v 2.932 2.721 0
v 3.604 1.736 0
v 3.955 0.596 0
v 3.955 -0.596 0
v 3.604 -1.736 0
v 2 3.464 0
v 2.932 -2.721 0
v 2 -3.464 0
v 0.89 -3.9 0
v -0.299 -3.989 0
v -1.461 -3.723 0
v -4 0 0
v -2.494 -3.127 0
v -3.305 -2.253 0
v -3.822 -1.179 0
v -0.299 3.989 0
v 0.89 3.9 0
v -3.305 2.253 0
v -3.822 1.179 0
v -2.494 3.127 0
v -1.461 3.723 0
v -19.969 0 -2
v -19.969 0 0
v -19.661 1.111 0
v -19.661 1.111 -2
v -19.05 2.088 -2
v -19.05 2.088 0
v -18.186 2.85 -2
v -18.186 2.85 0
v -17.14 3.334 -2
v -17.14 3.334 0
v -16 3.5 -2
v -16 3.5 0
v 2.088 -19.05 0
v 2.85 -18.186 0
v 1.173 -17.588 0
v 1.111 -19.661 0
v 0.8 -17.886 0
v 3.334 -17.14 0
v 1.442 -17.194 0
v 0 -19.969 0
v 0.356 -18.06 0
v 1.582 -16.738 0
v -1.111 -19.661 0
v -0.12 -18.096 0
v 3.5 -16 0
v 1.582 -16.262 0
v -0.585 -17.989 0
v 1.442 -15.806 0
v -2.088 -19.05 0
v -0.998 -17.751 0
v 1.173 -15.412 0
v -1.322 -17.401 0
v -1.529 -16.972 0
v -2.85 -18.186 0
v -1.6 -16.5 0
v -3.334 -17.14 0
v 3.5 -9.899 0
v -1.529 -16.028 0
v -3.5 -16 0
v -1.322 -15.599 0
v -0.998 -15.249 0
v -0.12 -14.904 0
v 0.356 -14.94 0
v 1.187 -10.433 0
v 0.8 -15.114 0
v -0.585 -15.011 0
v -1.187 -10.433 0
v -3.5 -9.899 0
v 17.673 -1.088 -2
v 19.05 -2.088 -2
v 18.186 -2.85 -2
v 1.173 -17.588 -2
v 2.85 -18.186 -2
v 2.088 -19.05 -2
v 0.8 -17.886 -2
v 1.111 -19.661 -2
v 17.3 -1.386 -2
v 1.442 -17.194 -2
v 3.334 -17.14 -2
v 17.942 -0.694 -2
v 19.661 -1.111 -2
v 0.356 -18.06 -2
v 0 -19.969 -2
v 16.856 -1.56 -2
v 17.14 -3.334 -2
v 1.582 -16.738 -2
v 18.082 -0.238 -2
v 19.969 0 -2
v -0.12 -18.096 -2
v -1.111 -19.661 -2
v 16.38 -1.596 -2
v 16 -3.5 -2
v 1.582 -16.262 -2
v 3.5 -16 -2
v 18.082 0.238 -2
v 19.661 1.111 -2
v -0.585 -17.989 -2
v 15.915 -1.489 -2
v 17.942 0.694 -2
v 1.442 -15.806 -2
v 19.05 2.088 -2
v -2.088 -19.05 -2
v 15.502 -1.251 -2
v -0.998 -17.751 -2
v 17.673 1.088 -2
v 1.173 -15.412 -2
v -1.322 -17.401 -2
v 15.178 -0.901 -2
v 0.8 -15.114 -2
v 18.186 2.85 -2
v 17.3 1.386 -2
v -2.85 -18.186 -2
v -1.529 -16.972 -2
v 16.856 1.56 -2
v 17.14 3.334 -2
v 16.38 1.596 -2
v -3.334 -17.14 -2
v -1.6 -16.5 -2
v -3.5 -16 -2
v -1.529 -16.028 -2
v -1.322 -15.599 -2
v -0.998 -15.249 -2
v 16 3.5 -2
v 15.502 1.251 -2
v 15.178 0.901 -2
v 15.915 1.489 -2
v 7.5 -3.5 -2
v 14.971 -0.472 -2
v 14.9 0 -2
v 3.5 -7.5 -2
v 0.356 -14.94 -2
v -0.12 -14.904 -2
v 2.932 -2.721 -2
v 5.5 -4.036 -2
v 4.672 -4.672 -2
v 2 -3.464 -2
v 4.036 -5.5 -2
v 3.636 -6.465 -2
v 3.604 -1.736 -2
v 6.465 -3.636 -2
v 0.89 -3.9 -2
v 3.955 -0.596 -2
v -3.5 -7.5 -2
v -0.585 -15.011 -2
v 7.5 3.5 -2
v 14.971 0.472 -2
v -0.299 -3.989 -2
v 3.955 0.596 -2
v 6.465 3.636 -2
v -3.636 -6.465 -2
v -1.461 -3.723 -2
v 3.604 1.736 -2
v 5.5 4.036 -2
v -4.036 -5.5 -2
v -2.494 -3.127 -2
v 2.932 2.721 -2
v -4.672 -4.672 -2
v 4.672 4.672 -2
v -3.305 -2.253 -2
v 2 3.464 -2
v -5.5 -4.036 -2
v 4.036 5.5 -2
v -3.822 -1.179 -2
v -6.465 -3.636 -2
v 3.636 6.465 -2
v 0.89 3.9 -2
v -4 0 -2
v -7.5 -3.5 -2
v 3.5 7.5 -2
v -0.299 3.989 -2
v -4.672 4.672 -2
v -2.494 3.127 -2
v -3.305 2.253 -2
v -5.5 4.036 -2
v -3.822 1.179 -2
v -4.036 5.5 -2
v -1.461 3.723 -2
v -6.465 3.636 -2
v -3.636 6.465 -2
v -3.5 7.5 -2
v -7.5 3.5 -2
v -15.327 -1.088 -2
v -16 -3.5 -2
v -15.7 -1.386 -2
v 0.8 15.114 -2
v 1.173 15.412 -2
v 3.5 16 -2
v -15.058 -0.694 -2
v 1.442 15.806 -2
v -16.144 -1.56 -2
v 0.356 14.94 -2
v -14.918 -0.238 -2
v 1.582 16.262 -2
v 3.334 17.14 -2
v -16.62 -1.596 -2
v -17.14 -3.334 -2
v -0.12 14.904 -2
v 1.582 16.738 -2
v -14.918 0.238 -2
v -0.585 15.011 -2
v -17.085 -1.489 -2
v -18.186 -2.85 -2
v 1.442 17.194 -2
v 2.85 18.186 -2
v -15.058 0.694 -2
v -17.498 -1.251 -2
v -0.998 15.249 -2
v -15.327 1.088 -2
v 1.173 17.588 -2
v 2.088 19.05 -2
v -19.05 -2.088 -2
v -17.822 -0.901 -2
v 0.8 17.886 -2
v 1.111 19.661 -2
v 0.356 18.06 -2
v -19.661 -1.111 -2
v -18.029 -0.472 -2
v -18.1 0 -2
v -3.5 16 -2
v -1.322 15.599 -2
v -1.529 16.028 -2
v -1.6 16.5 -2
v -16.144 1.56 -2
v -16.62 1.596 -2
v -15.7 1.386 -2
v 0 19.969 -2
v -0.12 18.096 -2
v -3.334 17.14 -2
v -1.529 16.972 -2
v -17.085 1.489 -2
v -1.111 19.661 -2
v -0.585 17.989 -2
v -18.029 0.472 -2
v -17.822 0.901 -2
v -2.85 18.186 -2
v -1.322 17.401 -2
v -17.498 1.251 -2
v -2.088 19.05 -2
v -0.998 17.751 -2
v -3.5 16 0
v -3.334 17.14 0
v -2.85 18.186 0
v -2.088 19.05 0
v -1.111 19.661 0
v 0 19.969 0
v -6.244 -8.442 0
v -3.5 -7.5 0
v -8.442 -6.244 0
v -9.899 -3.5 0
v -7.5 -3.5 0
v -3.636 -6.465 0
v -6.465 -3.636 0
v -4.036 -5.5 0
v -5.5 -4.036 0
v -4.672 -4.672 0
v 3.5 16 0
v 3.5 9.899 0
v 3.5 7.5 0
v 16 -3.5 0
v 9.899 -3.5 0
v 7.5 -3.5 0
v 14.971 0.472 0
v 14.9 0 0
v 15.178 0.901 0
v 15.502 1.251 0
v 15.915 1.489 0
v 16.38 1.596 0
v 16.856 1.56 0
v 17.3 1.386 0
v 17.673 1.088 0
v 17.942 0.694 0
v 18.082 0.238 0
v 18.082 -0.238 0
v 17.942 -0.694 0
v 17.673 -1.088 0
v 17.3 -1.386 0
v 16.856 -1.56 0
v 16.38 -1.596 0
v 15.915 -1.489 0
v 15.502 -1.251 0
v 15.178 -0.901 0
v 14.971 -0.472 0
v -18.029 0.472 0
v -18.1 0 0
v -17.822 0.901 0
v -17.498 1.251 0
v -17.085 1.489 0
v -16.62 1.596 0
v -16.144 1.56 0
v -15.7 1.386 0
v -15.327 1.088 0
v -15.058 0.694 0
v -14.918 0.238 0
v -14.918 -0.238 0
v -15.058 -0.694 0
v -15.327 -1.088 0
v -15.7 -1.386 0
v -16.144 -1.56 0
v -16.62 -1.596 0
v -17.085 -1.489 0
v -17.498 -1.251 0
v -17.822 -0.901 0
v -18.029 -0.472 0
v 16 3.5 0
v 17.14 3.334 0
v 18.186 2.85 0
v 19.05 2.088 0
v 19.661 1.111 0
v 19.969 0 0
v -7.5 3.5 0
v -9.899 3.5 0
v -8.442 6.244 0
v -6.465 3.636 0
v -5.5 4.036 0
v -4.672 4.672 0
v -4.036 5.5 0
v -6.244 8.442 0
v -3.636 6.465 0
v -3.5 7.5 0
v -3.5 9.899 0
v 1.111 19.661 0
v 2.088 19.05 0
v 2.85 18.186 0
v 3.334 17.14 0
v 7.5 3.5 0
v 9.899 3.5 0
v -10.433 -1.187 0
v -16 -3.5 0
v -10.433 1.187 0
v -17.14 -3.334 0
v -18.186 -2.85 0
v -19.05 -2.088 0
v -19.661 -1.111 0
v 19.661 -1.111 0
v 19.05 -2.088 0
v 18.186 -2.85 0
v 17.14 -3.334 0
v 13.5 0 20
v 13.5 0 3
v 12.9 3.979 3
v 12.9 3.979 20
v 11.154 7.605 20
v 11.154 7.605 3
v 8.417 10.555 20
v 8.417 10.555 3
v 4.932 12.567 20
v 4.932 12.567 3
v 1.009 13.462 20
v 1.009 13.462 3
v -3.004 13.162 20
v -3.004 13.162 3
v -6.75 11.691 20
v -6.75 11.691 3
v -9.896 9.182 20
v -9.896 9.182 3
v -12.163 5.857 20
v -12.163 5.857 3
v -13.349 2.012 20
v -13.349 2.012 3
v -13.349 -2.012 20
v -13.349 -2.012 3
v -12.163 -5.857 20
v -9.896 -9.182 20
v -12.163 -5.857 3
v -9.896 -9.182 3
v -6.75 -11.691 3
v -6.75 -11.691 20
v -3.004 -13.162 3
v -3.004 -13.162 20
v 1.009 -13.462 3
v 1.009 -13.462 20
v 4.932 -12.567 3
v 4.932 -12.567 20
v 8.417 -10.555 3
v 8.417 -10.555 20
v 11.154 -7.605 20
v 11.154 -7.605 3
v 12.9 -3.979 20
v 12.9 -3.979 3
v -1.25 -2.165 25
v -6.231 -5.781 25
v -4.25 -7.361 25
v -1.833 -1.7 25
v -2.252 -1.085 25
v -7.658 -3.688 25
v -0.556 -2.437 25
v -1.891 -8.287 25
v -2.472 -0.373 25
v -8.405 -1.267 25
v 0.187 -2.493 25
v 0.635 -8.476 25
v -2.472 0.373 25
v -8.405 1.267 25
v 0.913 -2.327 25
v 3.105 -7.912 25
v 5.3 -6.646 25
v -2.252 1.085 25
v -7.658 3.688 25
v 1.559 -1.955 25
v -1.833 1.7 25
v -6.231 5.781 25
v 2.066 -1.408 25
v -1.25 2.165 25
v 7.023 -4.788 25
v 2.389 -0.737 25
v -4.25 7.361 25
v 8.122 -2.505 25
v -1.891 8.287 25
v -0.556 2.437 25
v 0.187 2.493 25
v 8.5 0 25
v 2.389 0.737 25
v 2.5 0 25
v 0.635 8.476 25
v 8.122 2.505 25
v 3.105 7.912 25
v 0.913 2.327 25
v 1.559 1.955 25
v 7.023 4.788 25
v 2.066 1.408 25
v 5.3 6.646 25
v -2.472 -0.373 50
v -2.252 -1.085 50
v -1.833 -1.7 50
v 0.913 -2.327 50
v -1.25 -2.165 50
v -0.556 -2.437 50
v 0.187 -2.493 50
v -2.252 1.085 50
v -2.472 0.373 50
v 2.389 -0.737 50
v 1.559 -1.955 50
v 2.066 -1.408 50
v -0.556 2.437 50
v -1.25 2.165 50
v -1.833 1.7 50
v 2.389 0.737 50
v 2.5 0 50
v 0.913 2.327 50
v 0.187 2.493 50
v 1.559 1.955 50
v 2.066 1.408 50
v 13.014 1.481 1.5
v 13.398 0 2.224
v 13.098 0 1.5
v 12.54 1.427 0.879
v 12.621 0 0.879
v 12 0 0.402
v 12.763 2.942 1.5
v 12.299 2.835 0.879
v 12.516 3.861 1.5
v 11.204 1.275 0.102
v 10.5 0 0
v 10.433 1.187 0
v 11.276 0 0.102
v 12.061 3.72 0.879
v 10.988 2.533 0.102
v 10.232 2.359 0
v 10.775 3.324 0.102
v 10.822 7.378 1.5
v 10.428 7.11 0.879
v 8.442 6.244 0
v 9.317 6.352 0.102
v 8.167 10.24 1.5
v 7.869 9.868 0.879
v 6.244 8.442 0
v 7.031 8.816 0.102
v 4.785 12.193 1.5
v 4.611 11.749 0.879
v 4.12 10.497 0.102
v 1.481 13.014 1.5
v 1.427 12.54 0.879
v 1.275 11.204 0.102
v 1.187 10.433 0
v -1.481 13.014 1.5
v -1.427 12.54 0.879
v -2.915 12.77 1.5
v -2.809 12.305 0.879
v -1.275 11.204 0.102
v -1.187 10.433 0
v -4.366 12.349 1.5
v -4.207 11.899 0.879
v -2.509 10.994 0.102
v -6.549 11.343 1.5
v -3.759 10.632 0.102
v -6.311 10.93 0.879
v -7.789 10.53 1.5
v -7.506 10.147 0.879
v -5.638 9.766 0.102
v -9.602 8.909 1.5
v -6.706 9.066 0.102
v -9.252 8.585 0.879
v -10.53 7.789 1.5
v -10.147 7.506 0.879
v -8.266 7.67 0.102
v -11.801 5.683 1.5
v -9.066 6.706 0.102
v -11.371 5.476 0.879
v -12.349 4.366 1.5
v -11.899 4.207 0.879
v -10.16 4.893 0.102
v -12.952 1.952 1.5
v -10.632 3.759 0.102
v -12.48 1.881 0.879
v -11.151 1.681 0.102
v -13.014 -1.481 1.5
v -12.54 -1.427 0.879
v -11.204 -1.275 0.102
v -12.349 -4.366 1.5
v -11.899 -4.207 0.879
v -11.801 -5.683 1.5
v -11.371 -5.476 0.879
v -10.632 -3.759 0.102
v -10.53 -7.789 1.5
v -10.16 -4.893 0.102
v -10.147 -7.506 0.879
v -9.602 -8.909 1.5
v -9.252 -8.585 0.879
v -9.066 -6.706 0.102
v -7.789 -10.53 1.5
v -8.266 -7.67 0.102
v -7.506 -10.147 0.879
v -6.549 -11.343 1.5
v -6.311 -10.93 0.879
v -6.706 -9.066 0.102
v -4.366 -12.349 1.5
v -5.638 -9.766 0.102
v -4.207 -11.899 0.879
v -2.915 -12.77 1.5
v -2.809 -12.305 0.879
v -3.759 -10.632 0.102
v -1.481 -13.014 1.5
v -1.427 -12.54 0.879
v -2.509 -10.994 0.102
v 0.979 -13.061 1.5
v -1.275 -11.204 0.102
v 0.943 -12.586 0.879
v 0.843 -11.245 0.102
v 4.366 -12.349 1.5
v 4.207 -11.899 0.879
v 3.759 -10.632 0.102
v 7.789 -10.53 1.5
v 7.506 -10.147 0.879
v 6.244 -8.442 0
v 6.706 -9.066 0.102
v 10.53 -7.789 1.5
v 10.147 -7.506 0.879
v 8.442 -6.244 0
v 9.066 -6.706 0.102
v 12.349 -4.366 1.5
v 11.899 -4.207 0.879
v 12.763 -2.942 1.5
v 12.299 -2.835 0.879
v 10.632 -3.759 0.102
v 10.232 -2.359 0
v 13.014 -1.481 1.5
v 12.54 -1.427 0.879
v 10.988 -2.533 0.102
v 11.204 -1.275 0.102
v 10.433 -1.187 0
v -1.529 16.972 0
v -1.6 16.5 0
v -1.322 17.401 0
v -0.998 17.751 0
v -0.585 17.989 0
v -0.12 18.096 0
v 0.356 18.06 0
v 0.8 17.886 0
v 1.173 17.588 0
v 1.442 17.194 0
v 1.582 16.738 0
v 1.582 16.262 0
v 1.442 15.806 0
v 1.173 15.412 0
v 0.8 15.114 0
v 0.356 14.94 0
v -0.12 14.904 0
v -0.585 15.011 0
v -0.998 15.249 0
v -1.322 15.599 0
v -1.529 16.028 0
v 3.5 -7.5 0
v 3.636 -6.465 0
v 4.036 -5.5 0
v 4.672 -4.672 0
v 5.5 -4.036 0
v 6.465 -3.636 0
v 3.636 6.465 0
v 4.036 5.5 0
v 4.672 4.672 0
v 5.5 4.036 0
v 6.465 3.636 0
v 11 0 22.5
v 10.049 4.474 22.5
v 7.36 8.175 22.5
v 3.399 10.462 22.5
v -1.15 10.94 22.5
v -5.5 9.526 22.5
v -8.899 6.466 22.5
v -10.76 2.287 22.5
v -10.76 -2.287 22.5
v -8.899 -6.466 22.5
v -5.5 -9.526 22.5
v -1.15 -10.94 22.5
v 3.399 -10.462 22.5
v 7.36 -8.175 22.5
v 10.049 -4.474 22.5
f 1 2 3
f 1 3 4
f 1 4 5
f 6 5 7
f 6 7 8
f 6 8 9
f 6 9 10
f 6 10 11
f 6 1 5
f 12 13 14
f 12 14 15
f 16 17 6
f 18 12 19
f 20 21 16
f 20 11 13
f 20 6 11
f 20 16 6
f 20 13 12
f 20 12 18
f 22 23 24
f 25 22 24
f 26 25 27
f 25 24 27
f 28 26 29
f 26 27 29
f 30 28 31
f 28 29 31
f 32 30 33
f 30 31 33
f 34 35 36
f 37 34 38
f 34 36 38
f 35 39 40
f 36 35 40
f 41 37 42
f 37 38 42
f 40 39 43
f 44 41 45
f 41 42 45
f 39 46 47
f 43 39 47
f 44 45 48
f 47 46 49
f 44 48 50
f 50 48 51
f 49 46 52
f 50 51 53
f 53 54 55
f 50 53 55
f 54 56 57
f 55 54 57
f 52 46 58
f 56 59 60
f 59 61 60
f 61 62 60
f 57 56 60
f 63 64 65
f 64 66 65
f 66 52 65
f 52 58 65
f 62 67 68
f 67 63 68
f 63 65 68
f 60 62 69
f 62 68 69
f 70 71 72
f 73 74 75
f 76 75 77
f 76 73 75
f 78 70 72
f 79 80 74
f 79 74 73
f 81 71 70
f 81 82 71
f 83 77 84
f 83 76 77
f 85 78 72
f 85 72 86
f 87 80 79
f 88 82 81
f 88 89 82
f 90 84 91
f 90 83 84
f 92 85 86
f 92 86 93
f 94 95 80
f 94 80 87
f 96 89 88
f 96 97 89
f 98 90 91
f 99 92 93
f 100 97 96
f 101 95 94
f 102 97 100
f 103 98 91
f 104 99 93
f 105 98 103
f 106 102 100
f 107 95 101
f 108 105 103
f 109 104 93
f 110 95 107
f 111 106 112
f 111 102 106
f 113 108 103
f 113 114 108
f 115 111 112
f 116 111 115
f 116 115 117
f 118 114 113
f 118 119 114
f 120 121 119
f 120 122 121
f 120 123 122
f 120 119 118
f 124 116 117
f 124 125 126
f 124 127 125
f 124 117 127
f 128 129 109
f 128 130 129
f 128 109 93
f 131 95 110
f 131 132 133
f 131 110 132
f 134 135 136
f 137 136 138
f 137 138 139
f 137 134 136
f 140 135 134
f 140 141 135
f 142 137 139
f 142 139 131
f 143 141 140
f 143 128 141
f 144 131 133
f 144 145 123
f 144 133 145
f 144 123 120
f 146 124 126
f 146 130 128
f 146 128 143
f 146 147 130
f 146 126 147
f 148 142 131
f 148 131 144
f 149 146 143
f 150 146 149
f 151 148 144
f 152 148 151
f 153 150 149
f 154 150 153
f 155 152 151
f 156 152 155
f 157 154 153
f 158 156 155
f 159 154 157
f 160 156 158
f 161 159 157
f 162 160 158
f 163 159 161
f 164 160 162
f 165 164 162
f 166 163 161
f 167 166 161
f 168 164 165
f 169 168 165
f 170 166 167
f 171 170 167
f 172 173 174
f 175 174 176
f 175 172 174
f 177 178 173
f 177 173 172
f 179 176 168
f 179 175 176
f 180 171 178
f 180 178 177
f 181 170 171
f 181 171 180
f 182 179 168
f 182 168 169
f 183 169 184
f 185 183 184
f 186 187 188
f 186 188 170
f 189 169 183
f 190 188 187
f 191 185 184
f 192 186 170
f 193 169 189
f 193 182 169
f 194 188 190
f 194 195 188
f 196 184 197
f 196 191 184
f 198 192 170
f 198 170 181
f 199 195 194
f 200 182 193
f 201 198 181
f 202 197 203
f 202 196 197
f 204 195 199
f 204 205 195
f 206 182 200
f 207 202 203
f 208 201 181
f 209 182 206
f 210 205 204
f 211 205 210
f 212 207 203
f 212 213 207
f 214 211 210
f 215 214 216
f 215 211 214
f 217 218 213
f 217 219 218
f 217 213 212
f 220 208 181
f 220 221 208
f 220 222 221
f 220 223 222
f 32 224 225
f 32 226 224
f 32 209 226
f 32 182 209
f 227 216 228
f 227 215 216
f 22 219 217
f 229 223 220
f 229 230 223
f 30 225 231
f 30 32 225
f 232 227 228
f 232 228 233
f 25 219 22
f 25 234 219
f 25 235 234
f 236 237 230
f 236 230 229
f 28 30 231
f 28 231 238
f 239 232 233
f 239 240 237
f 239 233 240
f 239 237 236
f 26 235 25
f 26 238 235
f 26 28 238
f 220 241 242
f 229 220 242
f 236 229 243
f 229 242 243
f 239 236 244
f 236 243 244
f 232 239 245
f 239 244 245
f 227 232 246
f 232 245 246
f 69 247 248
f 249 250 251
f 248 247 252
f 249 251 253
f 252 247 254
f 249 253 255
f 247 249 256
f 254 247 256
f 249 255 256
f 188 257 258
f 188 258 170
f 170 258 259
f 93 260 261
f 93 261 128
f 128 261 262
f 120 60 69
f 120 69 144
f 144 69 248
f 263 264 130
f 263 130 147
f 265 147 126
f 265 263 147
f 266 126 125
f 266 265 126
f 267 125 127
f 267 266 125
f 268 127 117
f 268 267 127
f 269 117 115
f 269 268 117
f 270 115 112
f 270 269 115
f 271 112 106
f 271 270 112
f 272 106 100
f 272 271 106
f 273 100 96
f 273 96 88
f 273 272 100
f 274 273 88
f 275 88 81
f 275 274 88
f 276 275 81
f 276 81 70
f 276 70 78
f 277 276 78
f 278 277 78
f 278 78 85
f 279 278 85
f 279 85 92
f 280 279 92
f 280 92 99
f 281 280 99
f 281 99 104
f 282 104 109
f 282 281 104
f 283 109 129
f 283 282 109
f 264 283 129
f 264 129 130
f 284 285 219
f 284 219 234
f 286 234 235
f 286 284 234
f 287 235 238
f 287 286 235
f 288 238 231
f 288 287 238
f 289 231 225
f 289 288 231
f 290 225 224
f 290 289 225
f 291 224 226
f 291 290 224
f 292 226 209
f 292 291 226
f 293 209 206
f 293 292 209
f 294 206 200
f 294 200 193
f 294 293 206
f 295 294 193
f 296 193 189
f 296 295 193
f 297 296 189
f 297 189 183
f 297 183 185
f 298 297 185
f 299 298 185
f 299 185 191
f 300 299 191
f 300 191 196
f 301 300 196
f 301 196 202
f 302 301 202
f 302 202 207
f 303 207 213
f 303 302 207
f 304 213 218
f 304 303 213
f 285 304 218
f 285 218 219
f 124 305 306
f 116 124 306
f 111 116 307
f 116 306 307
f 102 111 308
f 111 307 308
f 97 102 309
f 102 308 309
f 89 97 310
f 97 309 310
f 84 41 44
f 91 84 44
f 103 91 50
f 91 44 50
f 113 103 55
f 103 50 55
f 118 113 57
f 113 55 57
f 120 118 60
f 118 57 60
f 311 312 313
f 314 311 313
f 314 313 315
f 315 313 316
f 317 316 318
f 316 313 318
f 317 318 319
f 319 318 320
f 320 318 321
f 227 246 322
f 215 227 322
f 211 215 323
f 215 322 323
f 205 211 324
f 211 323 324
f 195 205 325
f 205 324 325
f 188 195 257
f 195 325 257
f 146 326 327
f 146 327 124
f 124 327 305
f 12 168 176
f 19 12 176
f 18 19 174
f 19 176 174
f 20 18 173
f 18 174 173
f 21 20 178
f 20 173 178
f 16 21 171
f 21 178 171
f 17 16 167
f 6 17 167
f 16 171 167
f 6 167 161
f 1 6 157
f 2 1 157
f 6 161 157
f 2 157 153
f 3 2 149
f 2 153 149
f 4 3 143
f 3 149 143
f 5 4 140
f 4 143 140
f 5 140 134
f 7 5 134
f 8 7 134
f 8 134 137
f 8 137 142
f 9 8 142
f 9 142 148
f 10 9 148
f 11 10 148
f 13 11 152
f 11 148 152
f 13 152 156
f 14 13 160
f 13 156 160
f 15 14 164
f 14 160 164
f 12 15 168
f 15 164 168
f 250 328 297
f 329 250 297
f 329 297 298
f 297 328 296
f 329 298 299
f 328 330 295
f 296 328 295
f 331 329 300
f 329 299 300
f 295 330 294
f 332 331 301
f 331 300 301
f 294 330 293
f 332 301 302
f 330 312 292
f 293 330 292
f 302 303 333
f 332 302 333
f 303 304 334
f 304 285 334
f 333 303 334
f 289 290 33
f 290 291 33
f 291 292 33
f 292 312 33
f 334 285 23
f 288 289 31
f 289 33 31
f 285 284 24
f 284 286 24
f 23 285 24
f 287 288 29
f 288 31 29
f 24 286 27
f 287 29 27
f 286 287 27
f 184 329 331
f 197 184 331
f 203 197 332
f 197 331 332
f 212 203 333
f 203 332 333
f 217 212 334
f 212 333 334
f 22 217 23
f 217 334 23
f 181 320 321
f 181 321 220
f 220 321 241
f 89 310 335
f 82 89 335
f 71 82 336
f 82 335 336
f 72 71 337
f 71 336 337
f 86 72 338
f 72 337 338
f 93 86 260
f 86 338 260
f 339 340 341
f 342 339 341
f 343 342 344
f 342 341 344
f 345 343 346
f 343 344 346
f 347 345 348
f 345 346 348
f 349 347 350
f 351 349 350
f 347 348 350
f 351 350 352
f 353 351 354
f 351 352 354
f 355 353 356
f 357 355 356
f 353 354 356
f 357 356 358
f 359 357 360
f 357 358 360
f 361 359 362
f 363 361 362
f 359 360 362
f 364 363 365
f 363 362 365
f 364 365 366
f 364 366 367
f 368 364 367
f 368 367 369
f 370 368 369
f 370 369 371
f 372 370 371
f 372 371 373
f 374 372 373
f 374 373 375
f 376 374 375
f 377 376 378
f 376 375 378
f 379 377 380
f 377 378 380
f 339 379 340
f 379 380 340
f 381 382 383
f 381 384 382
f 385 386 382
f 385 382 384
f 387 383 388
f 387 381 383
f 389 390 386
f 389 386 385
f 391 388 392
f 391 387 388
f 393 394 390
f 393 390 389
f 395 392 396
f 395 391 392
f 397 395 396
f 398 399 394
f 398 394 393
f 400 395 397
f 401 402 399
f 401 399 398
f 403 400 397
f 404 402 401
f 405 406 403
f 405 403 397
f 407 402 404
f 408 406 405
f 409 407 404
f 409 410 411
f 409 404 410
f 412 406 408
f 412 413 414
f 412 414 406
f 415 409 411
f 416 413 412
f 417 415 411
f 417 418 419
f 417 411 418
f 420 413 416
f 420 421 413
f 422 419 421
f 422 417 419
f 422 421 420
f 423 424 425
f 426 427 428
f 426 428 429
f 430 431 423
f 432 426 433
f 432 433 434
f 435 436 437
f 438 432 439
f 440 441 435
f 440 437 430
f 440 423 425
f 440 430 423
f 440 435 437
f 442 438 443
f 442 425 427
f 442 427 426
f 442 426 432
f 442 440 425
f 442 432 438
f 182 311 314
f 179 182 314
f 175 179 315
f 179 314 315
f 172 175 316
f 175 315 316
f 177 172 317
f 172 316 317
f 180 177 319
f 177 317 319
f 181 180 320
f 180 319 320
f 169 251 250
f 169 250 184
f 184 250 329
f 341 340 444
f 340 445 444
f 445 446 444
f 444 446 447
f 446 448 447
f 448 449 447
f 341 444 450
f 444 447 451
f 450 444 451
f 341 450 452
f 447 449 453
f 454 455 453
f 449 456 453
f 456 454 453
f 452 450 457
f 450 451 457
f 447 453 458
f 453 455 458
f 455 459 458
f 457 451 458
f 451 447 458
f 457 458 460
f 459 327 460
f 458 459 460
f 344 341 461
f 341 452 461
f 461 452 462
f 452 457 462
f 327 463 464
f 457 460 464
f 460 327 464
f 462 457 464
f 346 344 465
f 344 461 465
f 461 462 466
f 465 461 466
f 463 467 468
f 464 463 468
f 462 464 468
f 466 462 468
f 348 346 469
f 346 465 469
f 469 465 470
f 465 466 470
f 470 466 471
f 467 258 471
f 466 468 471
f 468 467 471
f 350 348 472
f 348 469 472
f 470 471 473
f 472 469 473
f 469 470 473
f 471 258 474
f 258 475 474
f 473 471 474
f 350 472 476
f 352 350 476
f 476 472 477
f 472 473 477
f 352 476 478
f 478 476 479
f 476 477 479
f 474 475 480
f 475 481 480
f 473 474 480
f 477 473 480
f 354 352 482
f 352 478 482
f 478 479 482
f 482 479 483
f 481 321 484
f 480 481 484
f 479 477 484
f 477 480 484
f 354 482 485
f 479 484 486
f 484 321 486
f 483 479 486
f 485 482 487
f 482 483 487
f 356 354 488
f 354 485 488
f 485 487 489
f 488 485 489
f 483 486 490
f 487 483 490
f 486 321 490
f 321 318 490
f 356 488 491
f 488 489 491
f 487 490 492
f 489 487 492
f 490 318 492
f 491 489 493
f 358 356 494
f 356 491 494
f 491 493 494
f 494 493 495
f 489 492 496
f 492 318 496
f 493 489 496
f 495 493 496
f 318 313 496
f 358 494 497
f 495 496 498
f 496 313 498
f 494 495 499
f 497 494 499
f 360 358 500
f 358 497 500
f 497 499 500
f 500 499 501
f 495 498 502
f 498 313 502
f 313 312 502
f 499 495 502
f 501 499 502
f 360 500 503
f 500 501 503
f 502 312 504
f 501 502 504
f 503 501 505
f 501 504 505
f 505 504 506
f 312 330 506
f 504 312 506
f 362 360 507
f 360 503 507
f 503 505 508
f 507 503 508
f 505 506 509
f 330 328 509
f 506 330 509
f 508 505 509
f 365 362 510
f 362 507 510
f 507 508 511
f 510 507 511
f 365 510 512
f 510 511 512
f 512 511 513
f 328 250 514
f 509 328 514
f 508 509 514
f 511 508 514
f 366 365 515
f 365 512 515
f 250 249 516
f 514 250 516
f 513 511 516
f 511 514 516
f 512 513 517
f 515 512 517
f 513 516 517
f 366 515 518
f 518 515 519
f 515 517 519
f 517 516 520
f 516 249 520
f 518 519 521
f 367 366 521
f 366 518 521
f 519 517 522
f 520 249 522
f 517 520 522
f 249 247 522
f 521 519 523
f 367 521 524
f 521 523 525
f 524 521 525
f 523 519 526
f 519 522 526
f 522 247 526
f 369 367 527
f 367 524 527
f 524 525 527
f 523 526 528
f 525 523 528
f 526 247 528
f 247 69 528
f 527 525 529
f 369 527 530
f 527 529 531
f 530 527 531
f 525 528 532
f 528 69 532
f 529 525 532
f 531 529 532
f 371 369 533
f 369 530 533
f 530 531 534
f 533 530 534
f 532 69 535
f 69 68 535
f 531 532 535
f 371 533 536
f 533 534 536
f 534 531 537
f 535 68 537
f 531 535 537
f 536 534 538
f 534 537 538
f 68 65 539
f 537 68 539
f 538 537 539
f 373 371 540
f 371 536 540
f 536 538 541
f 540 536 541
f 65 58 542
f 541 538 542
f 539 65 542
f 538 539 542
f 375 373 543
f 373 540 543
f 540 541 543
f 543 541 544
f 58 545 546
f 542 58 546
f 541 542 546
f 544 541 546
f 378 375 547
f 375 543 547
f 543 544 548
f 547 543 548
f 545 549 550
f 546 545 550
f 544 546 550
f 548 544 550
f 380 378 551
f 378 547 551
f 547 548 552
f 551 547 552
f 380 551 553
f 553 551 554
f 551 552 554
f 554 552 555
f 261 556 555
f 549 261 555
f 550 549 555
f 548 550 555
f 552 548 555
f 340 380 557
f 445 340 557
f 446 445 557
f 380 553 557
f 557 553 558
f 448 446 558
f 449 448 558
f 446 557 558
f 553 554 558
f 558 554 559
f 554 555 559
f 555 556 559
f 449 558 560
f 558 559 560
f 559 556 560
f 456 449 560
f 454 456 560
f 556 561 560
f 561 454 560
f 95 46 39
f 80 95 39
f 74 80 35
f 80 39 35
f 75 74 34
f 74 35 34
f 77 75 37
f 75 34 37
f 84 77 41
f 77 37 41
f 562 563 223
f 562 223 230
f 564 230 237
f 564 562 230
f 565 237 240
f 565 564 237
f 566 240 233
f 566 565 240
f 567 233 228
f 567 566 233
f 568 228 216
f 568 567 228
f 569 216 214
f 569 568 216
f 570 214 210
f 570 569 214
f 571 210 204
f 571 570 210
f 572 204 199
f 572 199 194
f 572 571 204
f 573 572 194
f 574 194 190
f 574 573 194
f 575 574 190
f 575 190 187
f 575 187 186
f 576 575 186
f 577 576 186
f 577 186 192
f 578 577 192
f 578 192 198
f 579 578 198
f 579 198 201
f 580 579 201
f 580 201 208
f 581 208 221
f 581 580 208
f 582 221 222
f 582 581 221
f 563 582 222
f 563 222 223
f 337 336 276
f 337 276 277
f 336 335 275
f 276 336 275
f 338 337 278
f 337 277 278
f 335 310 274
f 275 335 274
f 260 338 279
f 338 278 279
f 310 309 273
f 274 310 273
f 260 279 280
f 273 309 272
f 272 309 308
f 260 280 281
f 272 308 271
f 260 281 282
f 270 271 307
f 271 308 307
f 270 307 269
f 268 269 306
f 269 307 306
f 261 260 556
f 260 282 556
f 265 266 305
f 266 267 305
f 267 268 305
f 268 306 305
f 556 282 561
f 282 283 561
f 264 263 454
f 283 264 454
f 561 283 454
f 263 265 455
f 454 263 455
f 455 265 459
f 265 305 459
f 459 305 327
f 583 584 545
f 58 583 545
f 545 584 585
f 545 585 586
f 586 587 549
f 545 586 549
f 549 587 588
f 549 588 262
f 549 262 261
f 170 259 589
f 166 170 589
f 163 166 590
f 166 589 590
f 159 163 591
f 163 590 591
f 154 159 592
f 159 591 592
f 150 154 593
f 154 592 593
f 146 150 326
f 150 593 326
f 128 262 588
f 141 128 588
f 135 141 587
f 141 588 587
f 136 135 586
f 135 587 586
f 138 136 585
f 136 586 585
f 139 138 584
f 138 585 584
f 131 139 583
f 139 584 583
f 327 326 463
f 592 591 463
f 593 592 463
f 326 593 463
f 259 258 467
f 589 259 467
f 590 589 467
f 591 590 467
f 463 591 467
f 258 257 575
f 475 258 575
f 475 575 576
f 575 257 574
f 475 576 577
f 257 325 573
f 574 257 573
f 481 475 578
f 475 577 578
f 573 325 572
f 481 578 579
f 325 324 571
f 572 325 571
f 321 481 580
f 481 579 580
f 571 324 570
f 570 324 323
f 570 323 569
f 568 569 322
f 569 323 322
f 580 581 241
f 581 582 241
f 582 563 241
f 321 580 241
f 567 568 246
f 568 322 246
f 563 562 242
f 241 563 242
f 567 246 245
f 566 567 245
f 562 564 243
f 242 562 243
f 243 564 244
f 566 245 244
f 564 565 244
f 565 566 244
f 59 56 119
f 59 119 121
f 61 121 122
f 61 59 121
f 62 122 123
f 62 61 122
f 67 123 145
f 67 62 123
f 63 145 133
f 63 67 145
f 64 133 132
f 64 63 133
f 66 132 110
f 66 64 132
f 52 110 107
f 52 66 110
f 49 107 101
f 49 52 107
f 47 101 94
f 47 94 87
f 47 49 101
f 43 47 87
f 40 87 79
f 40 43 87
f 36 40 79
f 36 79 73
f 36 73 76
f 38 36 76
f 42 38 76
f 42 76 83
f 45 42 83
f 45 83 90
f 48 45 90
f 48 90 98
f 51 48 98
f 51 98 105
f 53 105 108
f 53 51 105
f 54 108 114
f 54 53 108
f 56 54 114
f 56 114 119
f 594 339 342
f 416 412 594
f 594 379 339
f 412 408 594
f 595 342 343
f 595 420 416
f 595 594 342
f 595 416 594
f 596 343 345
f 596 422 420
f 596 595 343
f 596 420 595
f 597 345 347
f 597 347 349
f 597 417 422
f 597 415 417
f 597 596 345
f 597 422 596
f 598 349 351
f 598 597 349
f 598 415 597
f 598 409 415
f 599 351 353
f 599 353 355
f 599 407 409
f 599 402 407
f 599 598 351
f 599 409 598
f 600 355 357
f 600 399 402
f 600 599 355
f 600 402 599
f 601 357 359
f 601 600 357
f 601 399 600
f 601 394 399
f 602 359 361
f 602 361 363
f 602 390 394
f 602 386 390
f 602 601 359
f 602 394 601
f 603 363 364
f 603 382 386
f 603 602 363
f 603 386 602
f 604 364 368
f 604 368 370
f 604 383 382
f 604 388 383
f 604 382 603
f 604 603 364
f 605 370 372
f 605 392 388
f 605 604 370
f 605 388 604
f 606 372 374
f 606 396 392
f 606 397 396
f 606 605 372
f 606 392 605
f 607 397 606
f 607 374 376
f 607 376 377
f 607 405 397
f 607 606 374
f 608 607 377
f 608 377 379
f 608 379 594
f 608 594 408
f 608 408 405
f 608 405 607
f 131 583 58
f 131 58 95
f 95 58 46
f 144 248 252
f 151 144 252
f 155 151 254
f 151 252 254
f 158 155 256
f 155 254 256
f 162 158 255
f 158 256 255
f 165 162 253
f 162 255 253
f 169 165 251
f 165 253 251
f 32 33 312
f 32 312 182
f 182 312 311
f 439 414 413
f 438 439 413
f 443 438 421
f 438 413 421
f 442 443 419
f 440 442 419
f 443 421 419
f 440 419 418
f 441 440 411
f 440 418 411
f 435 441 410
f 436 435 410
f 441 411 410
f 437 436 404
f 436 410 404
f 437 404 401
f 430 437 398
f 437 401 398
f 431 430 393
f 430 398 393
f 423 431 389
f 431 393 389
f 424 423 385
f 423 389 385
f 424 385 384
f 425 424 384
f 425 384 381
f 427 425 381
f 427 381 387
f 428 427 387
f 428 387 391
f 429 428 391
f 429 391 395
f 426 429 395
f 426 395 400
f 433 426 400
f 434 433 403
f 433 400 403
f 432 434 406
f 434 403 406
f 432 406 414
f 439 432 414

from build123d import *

# Parameters (mm, degrees)
SKETCH1_R           = 13.5
BOSS_EXTRUDE1_DEPTH = 25
SKETCH2_R           = 2.5
BOSS_EXTRUDE2_DEPTH = 25
FILLET1_R           = 3
CHAMFER1_SIZE       = 5
SKETCH3_R           = 1.6
BOSS_EXTRUDE3_DEPTH = 2
SKETCH4_R           = 4
CUT_EXTRUDE1_DEPTH  = 2


with BuildPart() as part:
    # Sketch1 → Boss-Extrude1 (new body)
    with BuildSketch(Plane.XY):
        Circle(SKETCH1_R)
    extrude(amount=BOSS_EXTRUDE1_DEPTH)

    # Sketch2 → Boss-Extrude2 (add)
    with BuildSketch(Plane.XY.offset(25)):
        Circle(SKETCH2_R)
    extrude(amount=BOSS_EXTRUDE2_DEPTH)

    # Fillet1
    fillet1_edges = [part.edges().sort_by_distance(p)[0] for p in [
        (-13.5, 0, 0),
    ]]
    fillet(fillet1_edges, radius=FILLET1_R)

    # Chamfer1
    chamfer1_edges = [part.edges().sort_by_distance(p)[0] for p in [
        (-13.5, 0, 25),
    ]]
    chamfer(chamfer1_edges, length=CHAMFER1_SIZE)

    # Sketch3 → Boss-Extrude3 (add)
    with BuildSketch(Plane(origin=(0, 0, 0), x_dir=(-1, 0, 0), z_dir=(0, 0, -1))):
        with BuildLine():
            Line((-3.5, -7.5), (-3.5, -16))
            ThreePointArc((-3.5, -16), (-2.5, -18.645751311), (0, -19.968626967))
            ThreePointArc((0, -19.968626967), (2.5, -18.645751311), (3.5, -16))
            Line((3.5, -16), (3.5, -7.5))
            ThreePointArc((3.5, -7.5), (4.671572875, -4.671572875), (7.5, -3.5))
            Line((7.5, -3.5), (16, -3.5))
            ThreePointArc((16, -3.5), (18.645751311, -2.5), (19.968626967, 0))
            ThreePointArc((19.968626967, 0), (18.645751311, 2.5), (16, 3.5))
            Line((16, 3.5), (7.5, 3.5))
            ThreePointArc((7.5, 3.5), (4.671572875, 4.671572875), (3.5, 7.5))
            Line((3.5, 7.5), (3.5, 16))
            ThreePointArc((3.5, 16), (2.5, 18.645751311), (0, 19.968626967))
            ThreePointArc((0, 19.968626967), (-2.5, 18.645751311), (-3.5, 16))
            Line((-3.5, 16), (-3.5, 7.5))
            ThreePointArc((-3.5, 7.5), (-4.671572875, 4.671572875), (-7.5, 3.5))
            Line((-7.5, 3.5), (-16, 3.5))
            ThreePointArc((-16, 3.5), (-18.645751311, 2.5), (-19.968626967, 0))
            ThreePointArc((-19.968626967, 0), (-18.645751311, -2.5), (-16, -3.5))
            Line((-16, -3.5), (-7.5, -3.5))
            ThreePointArc((-7.5, -3.5), (-4.671572875, -4.671572875), (-3.5, -7.5))
        make_face()
        with Locations((-16.5, 0)):
            Circle(SKETCH3_R, mode=Mode.SUBTRACT)
        with Locations((0, 16.5)):
            Circle(SKETCH3_R, mode=Mode.SUBTRACT)
        with Locations((16.5, 0)):
            Circle(SKETCH3_R, mode=Mode.SUBTRACT)
        with Locations((0, -16.5)):
            Circle(SKETCH3_R, mode=Mode.SUBTRACT)
    extrude(amount=BOSS_EXTRUDE3_DEPTH)

    # Sketch4 → Cut-Extrude1 (cut)
    with BuildSketch(Plane(origin=(0, 0, -2), x_dir=(-1, 0, 0), z_dir=(0, 0, -1))):
        Circle(SKETCH4_R)
    extrude(amount=-CUT_EXTRUDE1_DEPTH, mode=Mode.SUBTRACT)


solid = part.part
